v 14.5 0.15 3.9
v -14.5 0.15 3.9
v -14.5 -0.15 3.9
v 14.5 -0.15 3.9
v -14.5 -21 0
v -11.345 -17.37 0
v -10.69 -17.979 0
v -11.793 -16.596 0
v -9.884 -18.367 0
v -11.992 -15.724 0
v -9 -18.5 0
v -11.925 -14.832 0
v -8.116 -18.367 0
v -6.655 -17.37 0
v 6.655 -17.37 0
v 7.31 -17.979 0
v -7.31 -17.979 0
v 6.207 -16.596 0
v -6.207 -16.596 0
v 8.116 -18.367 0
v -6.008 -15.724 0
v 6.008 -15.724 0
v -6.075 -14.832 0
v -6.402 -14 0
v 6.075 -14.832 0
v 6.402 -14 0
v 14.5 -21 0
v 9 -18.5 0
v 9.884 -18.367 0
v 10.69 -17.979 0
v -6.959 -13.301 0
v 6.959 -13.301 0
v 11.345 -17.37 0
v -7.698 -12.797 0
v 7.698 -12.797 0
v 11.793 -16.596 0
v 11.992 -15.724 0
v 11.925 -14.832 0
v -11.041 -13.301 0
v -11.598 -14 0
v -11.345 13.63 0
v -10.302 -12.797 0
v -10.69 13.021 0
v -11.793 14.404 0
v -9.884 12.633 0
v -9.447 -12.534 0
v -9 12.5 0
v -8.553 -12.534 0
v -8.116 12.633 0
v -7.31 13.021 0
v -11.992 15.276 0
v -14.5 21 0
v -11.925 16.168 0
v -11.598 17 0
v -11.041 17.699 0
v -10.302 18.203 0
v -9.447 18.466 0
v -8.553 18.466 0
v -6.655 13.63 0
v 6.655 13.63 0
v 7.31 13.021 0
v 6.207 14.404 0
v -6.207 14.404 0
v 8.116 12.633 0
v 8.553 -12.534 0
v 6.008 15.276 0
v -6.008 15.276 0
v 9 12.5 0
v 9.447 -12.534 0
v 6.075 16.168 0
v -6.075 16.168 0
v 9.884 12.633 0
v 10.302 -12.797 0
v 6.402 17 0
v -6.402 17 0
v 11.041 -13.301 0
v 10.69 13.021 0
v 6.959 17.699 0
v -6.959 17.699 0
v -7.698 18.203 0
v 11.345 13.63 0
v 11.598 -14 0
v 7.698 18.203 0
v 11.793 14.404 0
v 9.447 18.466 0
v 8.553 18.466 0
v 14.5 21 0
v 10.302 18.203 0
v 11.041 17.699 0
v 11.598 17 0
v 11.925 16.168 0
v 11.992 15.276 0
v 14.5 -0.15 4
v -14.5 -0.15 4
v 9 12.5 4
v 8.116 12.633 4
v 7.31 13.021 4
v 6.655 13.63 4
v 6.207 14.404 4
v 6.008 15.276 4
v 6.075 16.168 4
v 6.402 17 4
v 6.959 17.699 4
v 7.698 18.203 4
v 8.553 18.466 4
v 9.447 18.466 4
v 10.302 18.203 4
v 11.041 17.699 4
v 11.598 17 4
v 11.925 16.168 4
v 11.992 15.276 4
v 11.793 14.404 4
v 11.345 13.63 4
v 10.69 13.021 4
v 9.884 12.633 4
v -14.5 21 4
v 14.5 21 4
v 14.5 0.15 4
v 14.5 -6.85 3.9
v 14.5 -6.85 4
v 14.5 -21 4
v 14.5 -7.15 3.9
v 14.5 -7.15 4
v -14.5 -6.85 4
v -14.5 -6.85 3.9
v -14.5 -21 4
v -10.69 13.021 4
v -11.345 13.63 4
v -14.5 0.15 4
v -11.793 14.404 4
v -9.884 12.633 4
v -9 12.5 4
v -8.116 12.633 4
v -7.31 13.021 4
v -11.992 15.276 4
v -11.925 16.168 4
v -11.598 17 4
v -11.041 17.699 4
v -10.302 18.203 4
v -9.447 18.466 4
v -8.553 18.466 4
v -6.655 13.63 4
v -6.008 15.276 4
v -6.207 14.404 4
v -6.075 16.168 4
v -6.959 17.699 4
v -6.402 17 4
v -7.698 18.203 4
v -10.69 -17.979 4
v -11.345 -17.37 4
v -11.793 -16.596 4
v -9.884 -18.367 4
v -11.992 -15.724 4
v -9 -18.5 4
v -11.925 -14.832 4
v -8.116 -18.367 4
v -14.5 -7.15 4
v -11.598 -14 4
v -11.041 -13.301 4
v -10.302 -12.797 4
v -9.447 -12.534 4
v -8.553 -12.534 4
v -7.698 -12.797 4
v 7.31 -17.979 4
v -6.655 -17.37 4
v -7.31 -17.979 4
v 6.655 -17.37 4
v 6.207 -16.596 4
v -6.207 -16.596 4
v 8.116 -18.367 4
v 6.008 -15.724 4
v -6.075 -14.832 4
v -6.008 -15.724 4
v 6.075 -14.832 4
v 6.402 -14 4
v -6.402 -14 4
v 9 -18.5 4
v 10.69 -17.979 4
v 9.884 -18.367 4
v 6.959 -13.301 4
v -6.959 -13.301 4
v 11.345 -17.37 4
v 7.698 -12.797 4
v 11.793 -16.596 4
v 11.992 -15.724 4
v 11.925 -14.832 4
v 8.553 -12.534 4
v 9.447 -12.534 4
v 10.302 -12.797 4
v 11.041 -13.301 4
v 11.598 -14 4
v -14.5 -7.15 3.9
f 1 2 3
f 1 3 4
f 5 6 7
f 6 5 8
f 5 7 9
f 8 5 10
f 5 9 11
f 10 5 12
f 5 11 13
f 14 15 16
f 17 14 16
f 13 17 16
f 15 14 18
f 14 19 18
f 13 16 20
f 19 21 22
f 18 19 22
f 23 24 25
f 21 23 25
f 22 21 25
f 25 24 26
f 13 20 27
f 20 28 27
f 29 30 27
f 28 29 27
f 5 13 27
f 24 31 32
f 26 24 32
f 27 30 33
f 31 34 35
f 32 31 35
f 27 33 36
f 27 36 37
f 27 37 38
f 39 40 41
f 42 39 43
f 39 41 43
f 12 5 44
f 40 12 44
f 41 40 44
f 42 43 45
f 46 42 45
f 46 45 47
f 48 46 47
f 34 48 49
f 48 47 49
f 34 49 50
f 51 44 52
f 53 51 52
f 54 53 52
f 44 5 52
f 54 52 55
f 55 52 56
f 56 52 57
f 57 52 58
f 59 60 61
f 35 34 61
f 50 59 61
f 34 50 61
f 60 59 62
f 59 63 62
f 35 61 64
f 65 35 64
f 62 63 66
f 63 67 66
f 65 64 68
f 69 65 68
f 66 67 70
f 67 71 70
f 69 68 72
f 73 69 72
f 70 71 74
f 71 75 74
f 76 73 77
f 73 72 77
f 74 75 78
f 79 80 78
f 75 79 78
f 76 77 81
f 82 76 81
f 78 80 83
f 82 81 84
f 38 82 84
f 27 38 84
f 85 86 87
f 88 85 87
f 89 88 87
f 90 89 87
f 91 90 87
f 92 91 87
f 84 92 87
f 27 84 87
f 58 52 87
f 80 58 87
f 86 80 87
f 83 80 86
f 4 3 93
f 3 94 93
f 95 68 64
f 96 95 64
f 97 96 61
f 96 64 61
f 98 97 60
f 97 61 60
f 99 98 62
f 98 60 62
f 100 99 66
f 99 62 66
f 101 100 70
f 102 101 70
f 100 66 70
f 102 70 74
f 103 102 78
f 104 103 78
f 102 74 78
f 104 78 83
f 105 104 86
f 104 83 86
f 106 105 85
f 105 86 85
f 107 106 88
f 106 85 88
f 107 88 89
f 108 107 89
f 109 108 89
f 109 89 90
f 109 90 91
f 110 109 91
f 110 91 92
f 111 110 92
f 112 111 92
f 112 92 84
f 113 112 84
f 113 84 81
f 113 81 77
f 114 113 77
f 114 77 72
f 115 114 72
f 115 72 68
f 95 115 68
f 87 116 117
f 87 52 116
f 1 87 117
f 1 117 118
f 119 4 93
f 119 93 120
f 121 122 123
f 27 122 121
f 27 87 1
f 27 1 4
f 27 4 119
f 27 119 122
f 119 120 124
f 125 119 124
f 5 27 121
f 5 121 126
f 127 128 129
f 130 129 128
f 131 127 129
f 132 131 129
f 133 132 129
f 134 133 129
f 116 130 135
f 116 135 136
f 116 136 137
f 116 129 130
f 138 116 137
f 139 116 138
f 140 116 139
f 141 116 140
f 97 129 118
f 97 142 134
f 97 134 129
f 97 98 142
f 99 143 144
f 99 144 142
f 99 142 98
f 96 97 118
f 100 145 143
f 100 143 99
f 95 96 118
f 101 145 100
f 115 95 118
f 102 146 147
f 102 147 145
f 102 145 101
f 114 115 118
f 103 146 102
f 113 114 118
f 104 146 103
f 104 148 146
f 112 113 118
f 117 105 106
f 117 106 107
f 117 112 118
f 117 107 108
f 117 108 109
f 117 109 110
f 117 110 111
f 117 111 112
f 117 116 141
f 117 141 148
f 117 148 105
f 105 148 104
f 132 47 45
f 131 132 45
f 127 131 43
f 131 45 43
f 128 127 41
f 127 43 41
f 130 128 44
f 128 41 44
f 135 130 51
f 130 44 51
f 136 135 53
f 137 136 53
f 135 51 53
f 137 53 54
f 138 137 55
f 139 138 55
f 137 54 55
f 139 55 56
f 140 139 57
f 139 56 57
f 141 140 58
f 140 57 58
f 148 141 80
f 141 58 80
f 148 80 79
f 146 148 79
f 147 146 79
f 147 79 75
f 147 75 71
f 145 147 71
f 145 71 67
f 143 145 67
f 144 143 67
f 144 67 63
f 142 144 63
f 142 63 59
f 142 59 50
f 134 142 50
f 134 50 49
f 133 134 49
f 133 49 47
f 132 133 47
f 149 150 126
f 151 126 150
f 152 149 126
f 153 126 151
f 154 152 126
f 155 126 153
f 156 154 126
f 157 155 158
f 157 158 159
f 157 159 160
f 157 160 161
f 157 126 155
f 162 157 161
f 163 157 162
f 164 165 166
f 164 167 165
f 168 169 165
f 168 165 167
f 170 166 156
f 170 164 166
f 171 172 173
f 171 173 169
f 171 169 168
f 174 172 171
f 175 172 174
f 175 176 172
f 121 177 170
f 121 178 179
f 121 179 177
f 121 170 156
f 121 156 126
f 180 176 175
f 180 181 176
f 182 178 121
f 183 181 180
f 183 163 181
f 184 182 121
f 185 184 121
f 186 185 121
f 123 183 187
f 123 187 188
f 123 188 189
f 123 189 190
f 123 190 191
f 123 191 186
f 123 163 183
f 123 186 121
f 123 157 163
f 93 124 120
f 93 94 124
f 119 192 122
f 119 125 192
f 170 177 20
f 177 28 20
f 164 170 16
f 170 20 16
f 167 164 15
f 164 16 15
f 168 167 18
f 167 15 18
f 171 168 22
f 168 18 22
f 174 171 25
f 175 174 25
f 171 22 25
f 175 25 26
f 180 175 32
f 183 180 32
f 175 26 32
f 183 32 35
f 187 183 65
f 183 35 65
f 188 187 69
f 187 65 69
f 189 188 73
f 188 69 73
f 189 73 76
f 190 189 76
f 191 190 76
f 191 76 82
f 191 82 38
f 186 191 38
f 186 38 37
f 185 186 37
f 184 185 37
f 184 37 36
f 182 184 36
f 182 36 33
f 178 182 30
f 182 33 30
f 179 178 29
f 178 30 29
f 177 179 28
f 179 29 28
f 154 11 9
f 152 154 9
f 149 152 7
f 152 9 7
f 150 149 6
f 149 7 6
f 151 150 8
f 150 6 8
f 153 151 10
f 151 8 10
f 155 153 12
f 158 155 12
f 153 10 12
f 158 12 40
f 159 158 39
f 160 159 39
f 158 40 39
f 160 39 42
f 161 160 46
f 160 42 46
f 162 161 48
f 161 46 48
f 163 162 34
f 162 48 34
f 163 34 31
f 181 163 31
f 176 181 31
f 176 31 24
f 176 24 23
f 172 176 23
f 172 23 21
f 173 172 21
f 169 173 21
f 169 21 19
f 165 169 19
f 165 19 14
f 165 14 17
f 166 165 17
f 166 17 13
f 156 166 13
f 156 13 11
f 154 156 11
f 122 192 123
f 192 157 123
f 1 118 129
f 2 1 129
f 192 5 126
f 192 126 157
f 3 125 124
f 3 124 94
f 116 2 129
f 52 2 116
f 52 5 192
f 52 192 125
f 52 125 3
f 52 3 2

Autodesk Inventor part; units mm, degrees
ref_plane "YZ Plane" through (0, 0, 0) normal (1, 0, 0) x (0, 1, 0)
ref_plane "XZ Plane" through (0, 0, 0) normal (0, 1, 0) x (-1, 0, 0)
ref_plane "XY Plane" through (0, 0, 0) normal (0, 0, 1) x (1, 0, 0)
sketch "草圖1" plane through (0, 0, 0) normal (0, 0, 1) x (1, 0, 0)
  line L0 (14.5, -21) -> (-14.5, -21)
  line L1 (-14.5, -21) -> (-14.5, 21)
  line L2 (-14.5, 21) -> (14.5, 21)
  line L3 (14.5, 21) -> (14.5, -21)
  line L4 (14.5, 21) -> (-14.5, -21) construction
  point P0 (0, 0)
  dimension "d0" = 29
  dimension "d1" = 42
extrude "擠出1" add sketch "草圖1" along normal blind 4
sketch "草圖2" plane through (0, 0, 4) normal (0, 0, 1) x (1, 0, 0)
  line L0 (9, -15.5) -> (-9, -15.5)
  line L1 (-9, -15.5) -> (-9, 15.5)
  line L2 (-9, 15.5) -> (9, 15.5)
  line L3 (9, 15.5) -> (9, -15.5)
  line L4 (9, 15.5) -> (-9, -15.5) construction
  point P0 (0, 0)
  dimension "d4" = 31
  dimension "d5" = 18
hole "孔1" at (-9, 15.5, 4) at (9, 15.5, 4) at (9, -15.5, 4) at (-9, -15.5, 4) direction (0, 0, -1) diameter 6 end through all
sketch "草圖3" plane through (0, 0, 4) normal (0, 0, 1) x (1, 0, 0)
  line L0 (-14.5, -21) -> (-14.5, 21) projected
  line L1 (14.5, -21) -> (-14.5, -21) projected
  line L2 (14.5, 21) -> (14.5, -21) projected
  line L3 (-14.5, -6.85) -> (14.5, -6.85)
  line L4 (14.5, -6.85) -> (14.5, -7.15)
  line L5 (14.5, -7.15) -> (-14.5, -7.15)
  line L6 (-14.5, -7.15) -> (-14.5, -6.85)
  line L7 (-14.5, 0.15) -> (14.5, 0.15)
  line L8 (14.5, 0.15) -> (14.5, -0.15)
  line L9 (14.5, -0.15) -> (-14.5, -0.15)
  line L10 (-14.5, -0.15) -> (-14.5, 0.15)
  line L11 (-14.5, -7) -> (14.5, -7)
  line L12 (-14.5, 0) -> (14.5, 0)
  point P0 (0, 0)
  dimension "d13" = 0.3
  dimension "d14" = 0.3
  dimension "d15" = 14
  dimension "d16" = 21
emboss "浮雕1" sketch "草圖3" operation cut depth 0.1 direction (0, 0, -1) contours L0 L11 L2 L5 | L0 L3 L2 L11 | L0 L12 L2 L9 | L0 L7 L2 L12
properties part number "EBARA A Type 馬達側油視窗" material "PMMA 塑膠"
